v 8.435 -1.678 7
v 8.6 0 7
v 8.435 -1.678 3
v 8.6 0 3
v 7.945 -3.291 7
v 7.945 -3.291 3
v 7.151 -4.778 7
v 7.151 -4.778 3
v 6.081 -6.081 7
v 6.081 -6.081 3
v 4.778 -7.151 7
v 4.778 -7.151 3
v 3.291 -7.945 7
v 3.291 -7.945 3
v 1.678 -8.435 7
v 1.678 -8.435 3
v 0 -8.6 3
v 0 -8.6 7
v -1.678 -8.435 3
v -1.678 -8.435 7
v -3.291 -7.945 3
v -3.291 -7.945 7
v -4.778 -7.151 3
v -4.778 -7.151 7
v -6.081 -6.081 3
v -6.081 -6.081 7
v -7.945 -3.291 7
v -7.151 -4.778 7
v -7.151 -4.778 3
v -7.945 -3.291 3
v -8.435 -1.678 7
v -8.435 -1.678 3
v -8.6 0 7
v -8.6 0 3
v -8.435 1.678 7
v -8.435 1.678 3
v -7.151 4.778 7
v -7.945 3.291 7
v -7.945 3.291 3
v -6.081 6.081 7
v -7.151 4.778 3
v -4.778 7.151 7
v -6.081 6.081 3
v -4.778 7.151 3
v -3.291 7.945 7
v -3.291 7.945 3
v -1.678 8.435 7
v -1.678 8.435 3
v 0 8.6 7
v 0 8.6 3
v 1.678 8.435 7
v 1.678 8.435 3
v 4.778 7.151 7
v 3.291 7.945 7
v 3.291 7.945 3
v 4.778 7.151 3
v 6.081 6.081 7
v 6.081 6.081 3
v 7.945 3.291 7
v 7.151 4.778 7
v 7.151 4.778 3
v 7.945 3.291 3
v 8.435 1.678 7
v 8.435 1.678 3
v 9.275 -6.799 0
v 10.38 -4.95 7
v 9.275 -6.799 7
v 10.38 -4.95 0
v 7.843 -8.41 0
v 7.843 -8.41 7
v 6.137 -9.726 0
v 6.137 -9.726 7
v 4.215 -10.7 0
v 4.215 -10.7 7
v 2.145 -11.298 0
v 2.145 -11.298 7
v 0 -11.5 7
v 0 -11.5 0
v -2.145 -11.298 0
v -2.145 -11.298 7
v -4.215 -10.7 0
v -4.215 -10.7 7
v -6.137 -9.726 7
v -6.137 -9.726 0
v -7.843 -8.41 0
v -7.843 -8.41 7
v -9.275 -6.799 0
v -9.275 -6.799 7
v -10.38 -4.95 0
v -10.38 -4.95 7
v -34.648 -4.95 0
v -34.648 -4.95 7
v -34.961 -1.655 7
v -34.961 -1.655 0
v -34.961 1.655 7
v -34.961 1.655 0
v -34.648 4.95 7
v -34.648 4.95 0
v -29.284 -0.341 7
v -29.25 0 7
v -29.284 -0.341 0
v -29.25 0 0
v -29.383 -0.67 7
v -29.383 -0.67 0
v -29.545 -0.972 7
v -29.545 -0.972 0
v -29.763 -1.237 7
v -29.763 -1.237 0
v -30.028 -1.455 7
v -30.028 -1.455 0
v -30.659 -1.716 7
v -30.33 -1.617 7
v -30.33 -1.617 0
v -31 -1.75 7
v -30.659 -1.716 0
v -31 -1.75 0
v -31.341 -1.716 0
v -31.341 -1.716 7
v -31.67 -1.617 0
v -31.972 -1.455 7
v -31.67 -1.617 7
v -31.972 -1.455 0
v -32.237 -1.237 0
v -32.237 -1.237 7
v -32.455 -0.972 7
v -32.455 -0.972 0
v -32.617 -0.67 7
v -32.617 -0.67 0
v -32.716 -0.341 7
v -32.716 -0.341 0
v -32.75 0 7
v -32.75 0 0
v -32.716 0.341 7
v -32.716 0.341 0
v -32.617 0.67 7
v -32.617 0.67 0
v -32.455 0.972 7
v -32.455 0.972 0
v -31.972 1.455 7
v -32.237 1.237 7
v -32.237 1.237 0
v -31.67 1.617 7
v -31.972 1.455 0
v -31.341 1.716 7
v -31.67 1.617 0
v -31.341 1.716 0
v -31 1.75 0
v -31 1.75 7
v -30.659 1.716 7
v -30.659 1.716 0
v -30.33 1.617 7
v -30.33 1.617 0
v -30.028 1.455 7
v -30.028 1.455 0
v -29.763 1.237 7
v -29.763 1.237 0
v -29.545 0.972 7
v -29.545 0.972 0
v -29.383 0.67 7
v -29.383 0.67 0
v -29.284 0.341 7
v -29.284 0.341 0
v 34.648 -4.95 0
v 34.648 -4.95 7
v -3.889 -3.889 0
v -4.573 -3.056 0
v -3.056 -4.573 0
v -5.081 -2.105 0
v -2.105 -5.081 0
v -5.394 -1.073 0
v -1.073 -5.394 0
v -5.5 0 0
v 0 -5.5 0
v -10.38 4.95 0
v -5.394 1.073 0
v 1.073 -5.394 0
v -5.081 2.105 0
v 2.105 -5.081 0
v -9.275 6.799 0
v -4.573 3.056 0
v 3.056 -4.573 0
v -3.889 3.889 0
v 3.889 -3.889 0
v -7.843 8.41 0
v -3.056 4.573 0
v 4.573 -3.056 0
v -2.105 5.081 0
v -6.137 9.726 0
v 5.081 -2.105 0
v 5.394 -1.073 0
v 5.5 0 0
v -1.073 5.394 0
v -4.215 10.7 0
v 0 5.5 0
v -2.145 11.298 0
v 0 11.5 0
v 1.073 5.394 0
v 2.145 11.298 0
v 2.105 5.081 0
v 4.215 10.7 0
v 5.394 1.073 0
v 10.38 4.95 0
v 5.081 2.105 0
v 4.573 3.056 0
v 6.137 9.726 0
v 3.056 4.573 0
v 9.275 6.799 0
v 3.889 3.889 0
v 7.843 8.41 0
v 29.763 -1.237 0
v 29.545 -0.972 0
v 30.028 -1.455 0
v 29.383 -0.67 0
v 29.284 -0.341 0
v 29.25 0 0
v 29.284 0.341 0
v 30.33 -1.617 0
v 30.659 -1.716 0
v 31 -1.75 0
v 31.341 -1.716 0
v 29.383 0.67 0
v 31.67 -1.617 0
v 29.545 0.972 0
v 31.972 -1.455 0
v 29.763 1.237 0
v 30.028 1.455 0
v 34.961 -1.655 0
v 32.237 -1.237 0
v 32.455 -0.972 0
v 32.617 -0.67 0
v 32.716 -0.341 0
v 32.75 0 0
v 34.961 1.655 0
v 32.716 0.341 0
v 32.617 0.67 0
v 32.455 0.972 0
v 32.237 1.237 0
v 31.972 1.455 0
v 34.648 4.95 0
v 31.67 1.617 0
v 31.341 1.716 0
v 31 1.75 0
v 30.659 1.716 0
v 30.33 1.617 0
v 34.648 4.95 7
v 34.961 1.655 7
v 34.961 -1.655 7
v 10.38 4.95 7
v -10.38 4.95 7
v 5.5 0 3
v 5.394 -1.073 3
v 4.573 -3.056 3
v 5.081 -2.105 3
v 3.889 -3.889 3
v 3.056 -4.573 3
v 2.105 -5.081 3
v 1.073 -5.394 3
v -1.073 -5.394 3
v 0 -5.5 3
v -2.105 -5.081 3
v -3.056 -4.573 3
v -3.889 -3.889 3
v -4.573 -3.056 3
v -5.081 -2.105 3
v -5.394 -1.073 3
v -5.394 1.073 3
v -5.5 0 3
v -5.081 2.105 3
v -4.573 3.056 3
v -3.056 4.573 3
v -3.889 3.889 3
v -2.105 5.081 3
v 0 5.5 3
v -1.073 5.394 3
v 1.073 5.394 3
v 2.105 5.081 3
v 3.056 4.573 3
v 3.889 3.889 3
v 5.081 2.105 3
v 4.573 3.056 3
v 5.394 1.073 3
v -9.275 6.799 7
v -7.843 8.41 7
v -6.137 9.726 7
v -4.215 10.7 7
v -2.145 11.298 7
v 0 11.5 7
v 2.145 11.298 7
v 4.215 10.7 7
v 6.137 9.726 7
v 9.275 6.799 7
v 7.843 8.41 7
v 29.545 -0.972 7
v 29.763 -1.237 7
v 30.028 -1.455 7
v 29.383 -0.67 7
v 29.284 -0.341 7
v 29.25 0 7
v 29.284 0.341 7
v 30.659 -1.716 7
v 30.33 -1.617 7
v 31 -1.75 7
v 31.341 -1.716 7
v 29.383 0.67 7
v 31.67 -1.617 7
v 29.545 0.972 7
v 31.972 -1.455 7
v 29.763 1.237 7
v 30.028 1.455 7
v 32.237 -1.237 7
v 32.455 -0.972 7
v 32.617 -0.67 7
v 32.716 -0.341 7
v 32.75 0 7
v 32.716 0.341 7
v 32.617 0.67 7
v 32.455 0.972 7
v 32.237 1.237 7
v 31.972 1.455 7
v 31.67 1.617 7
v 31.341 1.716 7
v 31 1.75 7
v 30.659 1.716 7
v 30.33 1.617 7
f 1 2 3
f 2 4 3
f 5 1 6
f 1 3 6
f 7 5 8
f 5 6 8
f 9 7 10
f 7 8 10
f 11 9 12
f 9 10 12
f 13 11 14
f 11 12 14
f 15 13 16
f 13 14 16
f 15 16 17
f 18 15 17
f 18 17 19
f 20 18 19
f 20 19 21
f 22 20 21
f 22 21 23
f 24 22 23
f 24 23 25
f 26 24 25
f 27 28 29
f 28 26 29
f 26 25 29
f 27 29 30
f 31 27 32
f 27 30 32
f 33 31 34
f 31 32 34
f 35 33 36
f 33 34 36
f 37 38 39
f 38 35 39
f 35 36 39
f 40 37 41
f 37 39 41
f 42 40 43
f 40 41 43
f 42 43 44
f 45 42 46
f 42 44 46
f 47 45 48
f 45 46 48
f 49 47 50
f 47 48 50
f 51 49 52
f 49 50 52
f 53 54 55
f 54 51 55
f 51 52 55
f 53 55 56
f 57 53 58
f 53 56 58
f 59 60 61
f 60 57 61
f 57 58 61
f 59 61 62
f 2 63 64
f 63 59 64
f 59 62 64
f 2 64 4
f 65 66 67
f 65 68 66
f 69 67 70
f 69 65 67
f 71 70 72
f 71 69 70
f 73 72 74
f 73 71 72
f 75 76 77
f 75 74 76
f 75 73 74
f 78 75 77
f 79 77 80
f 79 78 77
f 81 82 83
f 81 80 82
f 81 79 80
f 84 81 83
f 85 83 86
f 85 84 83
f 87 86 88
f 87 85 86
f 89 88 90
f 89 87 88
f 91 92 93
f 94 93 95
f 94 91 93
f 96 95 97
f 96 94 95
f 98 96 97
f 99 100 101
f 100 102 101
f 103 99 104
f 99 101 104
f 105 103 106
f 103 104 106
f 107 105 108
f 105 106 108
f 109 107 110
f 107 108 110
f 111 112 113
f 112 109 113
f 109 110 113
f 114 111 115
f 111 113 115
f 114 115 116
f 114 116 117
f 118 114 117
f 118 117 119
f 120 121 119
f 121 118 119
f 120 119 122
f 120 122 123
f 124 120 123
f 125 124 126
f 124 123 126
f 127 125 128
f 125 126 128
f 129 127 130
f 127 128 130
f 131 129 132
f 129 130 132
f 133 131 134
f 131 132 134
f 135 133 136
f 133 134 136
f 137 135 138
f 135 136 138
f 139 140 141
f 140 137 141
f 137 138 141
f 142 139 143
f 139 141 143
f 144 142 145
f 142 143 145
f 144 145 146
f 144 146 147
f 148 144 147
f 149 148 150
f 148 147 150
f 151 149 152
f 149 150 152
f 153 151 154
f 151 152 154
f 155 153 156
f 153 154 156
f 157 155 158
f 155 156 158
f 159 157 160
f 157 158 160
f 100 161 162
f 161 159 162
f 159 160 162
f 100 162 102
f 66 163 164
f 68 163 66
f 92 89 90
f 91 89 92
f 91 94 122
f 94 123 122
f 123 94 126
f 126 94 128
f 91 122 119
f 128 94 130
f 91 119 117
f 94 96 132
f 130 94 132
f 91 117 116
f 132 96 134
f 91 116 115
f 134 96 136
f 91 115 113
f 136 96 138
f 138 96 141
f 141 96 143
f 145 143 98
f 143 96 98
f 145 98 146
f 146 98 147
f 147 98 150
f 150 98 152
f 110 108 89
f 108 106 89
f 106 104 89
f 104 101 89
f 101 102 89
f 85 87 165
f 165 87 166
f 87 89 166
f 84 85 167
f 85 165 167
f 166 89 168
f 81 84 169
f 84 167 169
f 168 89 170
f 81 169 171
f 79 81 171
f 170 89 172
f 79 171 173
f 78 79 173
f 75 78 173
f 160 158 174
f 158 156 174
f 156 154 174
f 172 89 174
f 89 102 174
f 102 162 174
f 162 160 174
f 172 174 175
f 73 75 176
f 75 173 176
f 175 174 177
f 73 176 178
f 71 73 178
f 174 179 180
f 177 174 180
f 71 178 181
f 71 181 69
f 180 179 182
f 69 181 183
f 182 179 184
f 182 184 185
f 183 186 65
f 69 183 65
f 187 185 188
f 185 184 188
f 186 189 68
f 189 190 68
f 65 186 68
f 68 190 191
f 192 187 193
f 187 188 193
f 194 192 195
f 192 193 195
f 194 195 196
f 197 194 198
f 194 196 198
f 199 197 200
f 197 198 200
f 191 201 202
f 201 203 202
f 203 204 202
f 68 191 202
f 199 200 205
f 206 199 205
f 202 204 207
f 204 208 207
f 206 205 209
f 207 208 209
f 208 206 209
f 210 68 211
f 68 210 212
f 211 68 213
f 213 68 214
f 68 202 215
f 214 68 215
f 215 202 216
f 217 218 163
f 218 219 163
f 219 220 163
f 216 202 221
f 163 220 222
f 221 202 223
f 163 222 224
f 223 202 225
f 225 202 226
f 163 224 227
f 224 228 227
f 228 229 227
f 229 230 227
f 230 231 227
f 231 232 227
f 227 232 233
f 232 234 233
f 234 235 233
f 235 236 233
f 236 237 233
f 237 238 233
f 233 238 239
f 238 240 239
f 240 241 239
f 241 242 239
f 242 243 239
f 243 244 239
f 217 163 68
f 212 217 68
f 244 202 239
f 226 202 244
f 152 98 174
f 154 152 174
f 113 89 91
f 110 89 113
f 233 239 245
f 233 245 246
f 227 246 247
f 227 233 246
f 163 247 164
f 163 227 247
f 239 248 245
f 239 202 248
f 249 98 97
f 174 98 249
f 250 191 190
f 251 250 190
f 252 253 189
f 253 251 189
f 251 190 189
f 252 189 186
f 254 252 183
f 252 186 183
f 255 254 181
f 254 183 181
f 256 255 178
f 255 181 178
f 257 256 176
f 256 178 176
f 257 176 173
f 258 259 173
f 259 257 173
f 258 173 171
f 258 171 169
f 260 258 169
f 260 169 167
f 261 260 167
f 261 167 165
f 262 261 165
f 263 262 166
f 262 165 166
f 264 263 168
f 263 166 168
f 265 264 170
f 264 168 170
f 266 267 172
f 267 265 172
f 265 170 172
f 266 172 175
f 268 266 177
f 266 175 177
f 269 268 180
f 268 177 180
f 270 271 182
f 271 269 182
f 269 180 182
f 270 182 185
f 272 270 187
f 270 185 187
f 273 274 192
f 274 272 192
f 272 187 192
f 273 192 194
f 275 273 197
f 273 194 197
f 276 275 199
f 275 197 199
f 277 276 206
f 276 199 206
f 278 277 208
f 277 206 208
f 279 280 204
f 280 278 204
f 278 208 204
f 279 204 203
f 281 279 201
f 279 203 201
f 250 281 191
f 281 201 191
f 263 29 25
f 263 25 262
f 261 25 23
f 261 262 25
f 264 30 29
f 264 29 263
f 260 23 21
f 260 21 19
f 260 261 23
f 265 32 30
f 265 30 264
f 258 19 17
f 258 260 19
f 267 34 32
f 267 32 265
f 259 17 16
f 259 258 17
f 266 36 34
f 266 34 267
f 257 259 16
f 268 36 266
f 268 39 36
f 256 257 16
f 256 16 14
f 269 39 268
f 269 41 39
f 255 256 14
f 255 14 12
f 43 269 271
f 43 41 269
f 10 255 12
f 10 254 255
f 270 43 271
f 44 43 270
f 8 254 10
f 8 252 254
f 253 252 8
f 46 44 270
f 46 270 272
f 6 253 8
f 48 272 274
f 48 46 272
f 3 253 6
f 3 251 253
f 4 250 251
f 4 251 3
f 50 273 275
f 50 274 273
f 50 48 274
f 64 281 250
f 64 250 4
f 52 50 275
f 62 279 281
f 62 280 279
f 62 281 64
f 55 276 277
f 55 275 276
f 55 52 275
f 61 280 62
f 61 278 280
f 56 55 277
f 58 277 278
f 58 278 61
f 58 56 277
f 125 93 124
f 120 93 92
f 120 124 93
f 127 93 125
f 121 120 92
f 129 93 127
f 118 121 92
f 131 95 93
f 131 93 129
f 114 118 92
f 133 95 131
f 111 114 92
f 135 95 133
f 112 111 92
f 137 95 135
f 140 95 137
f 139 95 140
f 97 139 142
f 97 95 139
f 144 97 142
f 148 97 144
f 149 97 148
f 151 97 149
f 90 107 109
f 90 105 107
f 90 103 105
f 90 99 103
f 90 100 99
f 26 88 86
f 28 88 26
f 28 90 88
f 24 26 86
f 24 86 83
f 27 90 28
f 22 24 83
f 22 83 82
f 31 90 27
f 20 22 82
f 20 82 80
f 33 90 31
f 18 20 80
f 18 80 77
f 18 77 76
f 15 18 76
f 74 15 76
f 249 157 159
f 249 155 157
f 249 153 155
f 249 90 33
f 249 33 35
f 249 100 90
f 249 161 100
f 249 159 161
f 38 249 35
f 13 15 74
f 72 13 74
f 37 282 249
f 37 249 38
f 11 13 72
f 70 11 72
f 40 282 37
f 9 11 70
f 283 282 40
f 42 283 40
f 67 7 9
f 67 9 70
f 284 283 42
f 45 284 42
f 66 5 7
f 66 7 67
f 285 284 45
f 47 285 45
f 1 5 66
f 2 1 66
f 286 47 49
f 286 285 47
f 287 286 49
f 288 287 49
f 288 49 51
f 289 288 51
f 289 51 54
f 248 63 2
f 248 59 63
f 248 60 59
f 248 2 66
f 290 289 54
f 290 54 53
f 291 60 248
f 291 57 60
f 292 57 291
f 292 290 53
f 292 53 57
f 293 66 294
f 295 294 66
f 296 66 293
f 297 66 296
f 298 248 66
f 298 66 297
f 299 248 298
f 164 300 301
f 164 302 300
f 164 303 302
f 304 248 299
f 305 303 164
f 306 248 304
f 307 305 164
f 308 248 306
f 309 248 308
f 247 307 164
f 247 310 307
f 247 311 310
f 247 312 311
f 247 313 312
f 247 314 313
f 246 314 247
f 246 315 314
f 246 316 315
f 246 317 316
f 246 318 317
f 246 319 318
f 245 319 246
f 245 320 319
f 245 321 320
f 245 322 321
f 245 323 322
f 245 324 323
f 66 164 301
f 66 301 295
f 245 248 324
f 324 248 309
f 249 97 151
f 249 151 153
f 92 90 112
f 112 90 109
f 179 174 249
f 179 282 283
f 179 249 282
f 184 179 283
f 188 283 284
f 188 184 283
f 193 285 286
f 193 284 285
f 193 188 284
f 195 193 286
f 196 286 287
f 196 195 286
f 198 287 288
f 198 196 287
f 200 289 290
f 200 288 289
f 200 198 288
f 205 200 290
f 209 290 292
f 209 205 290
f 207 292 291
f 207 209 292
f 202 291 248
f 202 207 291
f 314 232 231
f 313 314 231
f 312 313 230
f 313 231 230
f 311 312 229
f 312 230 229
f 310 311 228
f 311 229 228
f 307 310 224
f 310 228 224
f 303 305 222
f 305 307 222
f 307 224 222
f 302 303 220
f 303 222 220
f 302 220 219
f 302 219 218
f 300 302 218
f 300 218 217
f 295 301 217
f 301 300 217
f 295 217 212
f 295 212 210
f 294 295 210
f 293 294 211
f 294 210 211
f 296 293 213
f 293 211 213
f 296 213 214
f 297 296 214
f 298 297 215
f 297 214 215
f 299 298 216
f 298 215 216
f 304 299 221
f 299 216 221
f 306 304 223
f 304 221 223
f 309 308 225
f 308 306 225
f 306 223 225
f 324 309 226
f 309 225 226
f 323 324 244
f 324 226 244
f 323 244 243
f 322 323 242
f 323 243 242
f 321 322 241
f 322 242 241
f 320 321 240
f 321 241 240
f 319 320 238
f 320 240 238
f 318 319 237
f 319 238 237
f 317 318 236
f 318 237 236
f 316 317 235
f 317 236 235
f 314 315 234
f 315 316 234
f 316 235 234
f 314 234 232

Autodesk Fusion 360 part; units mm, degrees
sketch "Szkic1" plane through (0, 0, 0) normal (0, 0, 1) x (1, 0, 0)
  circle A0 centre (0, 0) radius 11.5
  circle A1 centre (0, 0) radius 8.6
  circle A2 centre (0, 0) radius 5.5
  dimension "d1" = 23
  dimension "d2" = 17.2
  dimension "d7" = 11
extrude "Wyciągnięcie proste1" add sketch "Szkic1" along normal blind 7 contours A0
extrude "Wyciągnięcie proste2" add sketch "Szkic1" along normal blind 3 contours A1
sketch "Szkic2" plane through (0, 0, 0) normal (0, 0, 1) x (1, 0, 0)
  line L0 (13.1003, -4.95) -> (-13.365, -4.95)
  line L1 (-13.365, -4.95) -> (-13.365, 5.05)
  line L2 (-13.365, 5.05) -> (13.635, 5.05)
  line L3 (13.1003, -4.95) -> (-13.365, 5.05) construction
  line L4 (-13.365, -4.95) -> (13.635, 5.05) construction
  line L5 (35, -4.95) -> (-35, -4.95)
  line L6 (-35, -4.95) -> (-35, 4.95)
  line L7 (-35, 4.95) -> (35, 4.95)
  line L8 (35, 4.95) -> (35, -4.95)
  line L9 (35, -4.95) -> (-35, 4.95) construction
  line L10 (-13.365, -4.95) -> (-21.365, -4.95)
  line L11 (-21.365, -4.95) -> (-21.365, 4.95)
  line L12 (-21.365, 4.95) -> (-13.365, 4.95)
  line L13 (-13.365, 4.95) -> (-13.365, -4.95)
  circle A0 centre (0, 0) radius 11.5
  line L14 (-35, -4.95) -> (-11.3867, -1.6104) construction
  line L15 (0, 0) -> (35, 4.95) construction
  line L16 (-18.365, 4.95) -> (-18.365, -4.95)
  circle A1 centre (0, 0) radius 35
  circle A2 centre (-31, 0) radius 1.75
  circle A3 centre (31, 0) radius 1.75
  dimension "d8" = 27
  dimension "d9" = 10
  dimension "d10" = 70
  dimension "d11" = 9.9
  dimension "d12" = 8
  dimension "d15" = 3
  dimension "d36" = 3.5
  dimension "d37" = 4
  dimension "d38" = 4
extrude "Wyciągnięcie proste3" add sketch "Szkic2" along normal blind 7 contours L0 L5 L7 A0 A1 | L0 L1 L5 L7 L13 A0 | L5 L7 L11 A1 | L1 L5 L7 L10 L12 L13 L16 | L5 L7 L10 L11 L12 L16
